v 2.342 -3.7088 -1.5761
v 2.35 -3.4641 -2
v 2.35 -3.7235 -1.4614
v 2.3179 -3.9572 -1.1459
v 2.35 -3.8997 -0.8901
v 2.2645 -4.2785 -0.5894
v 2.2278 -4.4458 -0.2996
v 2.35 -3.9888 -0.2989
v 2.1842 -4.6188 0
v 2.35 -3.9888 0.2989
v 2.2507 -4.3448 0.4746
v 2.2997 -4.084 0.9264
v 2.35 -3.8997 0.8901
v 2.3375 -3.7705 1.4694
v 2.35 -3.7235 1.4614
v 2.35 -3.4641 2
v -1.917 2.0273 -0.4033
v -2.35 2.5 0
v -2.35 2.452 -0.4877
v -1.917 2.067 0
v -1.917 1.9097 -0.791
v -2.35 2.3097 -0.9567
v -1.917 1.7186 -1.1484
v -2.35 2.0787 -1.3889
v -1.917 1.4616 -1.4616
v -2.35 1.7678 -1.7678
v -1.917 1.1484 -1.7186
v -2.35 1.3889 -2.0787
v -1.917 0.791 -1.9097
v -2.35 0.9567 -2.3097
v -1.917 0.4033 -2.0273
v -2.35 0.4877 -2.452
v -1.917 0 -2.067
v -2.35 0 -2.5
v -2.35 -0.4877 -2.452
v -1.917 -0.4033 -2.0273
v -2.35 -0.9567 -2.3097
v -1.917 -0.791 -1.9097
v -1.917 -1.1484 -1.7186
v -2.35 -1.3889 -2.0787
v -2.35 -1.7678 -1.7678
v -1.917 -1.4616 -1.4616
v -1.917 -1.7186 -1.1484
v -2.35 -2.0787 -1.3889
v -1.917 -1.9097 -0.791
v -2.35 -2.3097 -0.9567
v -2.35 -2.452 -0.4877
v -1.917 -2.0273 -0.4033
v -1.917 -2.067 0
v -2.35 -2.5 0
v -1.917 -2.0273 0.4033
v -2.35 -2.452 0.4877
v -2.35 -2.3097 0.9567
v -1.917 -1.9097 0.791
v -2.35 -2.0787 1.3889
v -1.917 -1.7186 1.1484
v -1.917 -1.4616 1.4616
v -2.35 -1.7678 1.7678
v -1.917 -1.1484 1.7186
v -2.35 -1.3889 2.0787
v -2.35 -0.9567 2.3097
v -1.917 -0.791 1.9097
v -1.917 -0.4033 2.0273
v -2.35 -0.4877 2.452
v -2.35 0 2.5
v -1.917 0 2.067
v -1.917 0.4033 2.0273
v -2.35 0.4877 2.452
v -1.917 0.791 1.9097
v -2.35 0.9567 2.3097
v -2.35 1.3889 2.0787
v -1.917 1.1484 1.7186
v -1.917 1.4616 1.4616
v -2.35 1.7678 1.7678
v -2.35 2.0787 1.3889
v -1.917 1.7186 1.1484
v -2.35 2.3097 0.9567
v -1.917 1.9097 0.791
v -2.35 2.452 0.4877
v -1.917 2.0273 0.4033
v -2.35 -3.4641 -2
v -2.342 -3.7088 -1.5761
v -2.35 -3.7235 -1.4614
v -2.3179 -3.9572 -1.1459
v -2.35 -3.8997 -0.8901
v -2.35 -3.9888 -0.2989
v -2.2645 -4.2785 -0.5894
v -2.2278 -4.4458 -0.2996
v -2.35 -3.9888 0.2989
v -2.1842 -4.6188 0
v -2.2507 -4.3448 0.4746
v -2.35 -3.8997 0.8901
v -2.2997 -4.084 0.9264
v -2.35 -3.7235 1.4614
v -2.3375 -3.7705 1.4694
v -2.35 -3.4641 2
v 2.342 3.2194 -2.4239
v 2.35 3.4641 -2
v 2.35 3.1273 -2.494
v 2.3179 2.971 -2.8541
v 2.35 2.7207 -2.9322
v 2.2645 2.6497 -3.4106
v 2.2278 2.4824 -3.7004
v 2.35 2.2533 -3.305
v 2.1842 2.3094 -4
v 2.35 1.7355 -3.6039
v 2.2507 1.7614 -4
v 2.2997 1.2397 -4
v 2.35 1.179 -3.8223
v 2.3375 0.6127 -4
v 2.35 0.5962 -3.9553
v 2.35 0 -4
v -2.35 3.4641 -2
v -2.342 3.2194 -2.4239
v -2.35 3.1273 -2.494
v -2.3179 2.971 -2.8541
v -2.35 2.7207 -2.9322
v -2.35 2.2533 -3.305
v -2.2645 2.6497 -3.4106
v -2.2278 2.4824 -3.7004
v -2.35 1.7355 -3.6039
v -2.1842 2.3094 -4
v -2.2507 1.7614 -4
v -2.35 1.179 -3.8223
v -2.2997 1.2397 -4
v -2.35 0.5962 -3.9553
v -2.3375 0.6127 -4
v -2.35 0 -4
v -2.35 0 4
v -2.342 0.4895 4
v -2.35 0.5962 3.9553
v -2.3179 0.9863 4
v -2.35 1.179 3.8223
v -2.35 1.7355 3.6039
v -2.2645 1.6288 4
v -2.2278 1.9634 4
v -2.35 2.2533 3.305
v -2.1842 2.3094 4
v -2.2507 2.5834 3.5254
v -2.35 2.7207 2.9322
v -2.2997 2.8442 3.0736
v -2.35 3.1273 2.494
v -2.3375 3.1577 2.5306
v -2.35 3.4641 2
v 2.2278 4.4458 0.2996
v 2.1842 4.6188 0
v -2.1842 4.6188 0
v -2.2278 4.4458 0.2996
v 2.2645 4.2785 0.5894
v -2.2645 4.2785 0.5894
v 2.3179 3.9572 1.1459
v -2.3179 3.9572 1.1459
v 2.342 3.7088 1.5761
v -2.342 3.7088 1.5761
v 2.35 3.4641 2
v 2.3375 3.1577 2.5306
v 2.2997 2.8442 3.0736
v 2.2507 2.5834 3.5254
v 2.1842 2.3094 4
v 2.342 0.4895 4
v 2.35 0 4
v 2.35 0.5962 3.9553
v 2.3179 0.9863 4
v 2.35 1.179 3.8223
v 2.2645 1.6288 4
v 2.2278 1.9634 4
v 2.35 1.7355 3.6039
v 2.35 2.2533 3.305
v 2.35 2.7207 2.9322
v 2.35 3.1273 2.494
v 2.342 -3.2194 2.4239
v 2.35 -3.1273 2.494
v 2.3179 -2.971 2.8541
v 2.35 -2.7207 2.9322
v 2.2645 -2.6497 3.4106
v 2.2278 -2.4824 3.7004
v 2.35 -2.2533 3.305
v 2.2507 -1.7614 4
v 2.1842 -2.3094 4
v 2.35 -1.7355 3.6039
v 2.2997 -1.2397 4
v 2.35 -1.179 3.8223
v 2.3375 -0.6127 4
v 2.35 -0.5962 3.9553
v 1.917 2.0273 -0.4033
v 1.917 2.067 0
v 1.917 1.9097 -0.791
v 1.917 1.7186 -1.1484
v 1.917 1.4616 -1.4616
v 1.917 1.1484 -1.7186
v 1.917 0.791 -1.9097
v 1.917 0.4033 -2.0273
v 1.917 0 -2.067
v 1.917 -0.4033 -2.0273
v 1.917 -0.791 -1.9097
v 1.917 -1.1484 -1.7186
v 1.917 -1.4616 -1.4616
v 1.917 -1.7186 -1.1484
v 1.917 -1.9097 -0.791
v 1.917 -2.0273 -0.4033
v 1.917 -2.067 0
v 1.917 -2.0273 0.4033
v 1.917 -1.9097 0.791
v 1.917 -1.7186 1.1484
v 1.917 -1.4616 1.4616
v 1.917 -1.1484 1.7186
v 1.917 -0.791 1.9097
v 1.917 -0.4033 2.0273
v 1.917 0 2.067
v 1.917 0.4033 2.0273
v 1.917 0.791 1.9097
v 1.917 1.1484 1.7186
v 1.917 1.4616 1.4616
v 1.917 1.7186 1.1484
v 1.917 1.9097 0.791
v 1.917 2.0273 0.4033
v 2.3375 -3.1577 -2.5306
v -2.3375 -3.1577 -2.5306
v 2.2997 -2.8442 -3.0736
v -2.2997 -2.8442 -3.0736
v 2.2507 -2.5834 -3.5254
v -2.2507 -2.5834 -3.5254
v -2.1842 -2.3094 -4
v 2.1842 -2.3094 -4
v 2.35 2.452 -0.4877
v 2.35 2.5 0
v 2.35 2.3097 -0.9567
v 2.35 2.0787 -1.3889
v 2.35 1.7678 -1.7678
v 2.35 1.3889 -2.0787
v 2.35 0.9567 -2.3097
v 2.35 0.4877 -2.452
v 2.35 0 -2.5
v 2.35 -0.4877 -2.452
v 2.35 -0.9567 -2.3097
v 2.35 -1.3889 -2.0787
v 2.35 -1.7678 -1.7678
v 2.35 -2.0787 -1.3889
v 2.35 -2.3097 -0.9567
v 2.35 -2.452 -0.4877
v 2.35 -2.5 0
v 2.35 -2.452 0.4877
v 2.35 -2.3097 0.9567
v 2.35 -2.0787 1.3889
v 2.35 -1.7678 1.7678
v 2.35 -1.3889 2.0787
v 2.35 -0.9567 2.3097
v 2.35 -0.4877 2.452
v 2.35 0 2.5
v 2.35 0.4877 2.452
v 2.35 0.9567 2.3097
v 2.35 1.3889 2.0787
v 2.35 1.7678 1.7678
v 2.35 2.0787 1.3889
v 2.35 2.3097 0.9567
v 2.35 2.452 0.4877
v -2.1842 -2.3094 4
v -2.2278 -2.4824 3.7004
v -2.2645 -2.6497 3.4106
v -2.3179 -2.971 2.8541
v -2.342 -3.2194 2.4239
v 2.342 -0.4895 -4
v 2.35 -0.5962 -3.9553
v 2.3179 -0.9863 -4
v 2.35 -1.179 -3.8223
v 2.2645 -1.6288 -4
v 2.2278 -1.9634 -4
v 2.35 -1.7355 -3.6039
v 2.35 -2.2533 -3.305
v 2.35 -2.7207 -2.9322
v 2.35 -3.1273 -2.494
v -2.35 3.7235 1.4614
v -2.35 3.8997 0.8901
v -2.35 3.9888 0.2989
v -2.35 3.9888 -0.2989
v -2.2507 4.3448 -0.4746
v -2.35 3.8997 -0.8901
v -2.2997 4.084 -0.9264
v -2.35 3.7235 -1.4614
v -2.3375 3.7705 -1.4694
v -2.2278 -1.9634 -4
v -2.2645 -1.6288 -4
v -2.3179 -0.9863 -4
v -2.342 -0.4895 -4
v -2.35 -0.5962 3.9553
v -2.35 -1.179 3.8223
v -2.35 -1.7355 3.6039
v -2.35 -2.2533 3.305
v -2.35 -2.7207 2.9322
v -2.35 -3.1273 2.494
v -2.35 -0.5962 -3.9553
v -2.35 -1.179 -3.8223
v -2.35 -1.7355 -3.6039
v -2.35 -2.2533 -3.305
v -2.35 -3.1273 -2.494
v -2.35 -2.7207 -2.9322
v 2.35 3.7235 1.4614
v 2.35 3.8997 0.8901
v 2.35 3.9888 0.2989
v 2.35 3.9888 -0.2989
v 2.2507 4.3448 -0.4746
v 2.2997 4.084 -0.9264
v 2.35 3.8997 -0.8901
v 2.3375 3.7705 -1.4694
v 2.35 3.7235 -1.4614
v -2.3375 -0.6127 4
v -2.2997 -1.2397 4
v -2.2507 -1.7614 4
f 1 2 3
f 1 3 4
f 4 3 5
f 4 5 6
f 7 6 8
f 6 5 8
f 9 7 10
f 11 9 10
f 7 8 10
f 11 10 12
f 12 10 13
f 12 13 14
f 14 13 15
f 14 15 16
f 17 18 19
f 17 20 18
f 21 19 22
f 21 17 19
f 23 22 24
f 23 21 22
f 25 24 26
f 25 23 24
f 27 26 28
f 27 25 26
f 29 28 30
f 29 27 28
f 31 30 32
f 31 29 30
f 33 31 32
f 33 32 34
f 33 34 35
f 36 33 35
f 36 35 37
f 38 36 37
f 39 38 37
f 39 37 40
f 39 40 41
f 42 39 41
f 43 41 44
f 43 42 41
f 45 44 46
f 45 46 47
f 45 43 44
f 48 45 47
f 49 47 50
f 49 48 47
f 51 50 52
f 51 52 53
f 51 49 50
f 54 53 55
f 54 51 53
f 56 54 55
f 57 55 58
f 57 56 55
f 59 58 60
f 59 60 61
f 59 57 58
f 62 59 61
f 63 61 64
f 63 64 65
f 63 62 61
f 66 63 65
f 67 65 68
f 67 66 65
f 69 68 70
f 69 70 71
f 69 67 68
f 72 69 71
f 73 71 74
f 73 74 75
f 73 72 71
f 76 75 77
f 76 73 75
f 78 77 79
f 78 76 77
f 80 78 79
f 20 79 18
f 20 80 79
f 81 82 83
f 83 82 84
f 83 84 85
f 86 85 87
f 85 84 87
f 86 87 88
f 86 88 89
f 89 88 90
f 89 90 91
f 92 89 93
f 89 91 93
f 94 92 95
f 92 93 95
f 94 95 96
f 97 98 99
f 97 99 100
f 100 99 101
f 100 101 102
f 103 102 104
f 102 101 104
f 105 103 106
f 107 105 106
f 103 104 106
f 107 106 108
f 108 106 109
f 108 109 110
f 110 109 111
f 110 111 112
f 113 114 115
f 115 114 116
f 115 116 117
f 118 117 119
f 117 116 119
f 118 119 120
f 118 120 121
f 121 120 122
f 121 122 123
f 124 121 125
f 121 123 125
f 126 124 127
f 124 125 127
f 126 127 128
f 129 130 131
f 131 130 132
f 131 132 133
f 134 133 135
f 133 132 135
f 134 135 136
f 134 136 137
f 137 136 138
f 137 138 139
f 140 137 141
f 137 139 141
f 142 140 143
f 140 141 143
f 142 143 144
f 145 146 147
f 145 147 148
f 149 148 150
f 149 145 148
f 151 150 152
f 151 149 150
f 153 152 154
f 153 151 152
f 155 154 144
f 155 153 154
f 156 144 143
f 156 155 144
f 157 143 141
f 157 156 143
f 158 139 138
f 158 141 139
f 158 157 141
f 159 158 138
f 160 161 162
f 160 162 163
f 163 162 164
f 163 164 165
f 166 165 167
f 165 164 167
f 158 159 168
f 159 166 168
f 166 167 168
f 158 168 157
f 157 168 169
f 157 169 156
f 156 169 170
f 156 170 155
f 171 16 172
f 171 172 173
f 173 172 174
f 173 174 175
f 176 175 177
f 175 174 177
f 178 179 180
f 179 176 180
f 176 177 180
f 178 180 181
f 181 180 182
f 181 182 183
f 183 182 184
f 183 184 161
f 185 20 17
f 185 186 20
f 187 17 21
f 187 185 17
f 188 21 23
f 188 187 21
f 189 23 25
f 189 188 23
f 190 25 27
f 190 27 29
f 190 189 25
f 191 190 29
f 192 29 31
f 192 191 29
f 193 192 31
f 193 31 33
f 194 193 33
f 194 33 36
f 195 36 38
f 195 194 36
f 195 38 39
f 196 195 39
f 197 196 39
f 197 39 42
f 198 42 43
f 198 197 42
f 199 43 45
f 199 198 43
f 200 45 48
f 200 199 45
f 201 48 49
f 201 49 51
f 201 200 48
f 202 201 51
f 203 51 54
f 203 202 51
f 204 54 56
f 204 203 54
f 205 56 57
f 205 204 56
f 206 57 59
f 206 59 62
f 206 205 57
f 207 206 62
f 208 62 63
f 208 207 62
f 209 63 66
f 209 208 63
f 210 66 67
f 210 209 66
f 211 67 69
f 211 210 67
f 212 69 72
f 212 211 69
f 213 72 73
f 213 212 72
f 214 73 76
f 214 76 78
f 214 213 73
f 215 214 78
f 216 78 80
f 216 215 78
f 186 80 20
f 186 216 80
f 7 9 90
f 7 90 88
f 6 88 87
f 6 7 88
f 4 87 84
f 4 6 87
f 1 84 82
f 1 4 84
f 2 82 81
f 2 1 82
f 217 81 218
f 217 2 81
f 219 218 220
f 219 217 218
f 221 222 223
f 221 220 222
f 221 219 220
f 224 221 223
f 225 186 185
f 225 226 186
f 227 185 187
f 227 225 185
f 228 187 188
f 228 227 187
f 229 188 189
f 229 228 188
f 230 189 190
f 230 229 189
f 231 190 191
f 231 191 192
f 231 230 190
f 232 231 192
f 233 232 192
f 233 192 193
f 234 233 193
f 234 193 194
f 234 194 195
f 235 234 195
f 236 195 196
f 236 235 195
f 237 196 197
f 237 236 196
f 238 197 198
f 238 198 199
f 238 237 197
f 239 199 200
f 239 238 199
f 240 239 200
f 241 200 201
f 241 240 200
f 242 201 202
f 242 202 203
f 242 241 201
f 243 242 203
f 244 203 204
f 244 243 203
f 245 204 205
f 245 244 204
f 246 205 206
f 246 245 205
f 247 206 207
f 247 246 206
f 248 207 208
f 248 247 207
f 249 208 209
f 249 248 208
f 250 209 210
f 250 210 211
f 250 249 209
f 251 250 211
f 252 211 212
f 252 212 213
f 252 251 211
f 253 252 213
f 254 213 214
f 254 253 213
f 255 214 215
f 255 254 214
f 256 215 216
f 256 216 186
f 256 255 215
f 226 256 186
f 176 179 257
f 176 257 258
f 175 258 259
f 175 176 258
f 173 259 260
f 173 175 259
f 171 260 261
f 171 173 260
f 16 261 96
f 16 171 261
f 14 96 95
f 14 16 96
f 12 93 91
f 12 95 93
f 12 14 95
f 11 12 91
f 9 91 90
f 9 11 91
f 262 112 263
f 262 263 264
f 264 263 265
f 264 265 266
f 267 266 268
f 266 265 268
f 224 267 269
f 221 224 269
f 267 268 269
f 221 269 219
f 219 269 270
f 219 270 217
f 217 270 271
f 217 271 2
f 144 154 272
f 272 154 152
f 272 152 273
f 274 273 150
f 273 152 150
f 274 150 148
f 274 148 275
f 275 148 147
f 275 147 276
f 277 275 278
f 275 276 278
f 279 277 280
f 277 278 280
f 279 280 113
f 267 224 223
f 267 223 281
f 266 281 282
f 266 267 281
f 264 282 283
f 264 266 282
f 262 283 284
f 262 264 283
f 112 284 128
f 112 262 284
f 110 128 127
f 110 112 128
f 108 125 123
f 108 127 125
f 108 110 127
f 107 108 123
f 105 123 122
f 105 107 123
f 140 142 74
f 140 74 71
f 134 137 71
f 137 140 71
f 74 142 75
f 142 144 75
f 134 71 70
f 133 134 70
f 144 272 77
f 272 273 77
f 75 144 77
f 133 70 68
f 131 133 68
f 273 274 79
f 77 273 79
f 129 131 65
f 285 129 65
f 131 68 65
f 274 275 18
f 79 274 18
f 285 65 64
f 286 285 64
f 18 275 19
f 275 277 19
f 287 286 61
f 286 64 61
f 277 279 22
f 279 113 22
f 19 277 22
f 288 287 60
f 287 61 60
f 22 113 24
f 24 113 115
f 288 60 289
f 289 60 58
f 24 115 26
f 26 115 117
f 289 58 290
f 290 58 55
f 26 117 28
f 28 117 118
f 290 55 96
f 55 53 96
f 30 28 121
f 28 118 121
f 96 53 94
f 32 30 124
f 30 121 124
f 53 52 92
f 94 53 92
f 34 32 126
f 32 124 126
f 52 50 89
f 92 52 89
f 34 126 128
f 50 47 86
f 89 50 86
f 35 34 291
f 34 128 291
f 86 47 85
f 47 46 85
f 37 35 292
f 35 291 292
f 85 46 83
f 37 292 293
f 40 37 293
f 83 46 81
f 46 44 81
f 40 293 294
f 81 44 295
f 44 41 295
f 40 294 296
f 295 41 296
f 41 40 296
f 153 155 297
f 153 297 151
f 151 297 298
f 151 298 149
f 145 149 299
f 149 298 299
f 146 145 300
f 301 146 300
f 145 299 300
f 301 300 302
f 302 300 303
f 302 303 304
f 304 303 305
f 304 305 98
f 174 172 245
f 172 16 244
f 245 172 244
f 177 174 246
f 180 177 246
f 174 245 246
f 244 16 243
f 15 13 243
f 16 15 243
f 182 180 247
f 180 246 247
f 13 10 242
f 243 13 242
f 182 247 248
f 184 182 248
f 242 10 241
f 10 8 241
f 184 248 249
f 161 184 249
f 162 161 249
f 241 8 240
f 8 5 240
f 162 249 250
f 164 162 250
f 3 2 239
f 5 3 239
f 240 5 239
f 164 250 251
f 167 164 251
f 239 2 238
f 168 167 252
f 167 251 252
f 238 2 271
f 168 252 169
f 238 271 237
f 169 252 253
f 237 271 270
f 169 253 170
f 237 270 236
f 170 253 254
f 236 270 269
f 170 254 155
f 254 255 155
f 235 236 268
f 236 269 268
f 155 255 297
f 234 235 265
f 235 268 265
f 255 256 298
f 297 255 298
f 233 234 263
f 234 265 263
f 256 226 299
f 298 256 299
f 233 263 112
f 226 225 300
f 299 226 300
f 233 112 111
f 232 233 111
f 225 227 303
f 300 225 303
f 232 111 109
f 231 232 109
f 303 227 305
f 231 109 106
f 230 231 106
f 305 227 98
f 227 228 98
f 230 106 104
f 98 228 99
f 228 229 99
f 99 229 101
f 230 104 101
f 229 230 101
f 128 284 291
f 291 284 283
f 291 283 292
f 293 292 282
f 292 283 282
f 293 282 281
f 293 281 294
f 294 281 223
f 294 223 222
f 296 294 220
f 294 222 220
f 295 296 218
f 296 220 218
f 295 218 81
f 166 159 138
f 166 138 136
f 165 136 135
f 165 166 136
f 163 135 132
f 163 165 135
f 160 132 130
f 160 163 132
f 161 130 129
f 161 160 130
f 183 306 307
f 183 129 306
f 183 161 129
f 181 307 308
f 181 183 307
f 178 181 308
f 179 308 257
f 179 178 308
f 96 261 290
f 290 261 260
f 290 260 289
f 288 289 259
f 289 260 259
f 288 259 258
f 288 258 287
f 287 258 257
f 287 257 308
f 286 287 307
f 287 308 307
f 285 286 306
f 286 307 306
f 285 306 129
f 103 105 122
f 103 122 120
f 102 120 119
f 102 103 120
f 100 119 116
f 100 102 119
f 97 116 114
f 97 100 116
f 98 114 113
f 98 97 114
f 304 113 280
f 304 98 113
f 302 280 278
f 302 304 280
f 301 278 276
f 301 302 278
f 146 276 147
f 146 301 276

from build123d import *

# Parameters (mm, degrees)
SKETCH3_W               = 16
SKETCH3_H               = 16
CUT_EXTRUDE1_DEPTH      = 4.7
CUT_EXTRUDE1_DEPTH_BACK = 4.7


with BuildPart() as part:
    # Sketch1 → Revolve1 (revolve)
    with BuildSketch(Plane.XY):
        Polygon((-2.35, 0), (-2.35, 4), (-2.135640646, 4.8), (2.135640646, 4.8), (2.35, 4), (2.35, 0), align=None)
    revolve(axis=Axis((2.35, 0, 0), (-1, 0, 0)))

    # Sketch2 → Cut-Revolve1 (revolve, cut)
    with BuildSketch(Plane.XY):
        Polygon((-2.35, 0), (-2.35, 2.5), (-1.917, 2.067), (1.917, 2.067), (2.35, 2.5), (2.35, 0), align=None)
    revolve(axis=Axis((2.35, 0, 0), (-1, 0, 0)), mode=Mode.SUBTRACT)

    # Sketch3 → Cut-Extrude1 (cut, two sides)
    with BuildSketch(Plane(origin=(0, 0, 0), x_dir=(0, 0, -1), z_dir=(1, 0, 0))) as cut_extrude1_sk:
        Rectangle(SKETCH3_W, SKETCH3_H)
        Polygon((-4, 2.309401077), (-4, -2.309401077), (0, -4.618802154), (4, -2.309401077), (4, 2.309401077), (0, 4.618802154), align=None, mode=Mode.SUBTRACT)
    extrude(amount=CUT_EXTRUDE1_DEPTH, mode=Mode.SUBTRACT)
    extrude(cut_extrude1_sk.sketch, amount=-CUT_EXTRUDE1_DEPTH_BACK, mode=Mode.SUBTRACT)


solid = part.part
